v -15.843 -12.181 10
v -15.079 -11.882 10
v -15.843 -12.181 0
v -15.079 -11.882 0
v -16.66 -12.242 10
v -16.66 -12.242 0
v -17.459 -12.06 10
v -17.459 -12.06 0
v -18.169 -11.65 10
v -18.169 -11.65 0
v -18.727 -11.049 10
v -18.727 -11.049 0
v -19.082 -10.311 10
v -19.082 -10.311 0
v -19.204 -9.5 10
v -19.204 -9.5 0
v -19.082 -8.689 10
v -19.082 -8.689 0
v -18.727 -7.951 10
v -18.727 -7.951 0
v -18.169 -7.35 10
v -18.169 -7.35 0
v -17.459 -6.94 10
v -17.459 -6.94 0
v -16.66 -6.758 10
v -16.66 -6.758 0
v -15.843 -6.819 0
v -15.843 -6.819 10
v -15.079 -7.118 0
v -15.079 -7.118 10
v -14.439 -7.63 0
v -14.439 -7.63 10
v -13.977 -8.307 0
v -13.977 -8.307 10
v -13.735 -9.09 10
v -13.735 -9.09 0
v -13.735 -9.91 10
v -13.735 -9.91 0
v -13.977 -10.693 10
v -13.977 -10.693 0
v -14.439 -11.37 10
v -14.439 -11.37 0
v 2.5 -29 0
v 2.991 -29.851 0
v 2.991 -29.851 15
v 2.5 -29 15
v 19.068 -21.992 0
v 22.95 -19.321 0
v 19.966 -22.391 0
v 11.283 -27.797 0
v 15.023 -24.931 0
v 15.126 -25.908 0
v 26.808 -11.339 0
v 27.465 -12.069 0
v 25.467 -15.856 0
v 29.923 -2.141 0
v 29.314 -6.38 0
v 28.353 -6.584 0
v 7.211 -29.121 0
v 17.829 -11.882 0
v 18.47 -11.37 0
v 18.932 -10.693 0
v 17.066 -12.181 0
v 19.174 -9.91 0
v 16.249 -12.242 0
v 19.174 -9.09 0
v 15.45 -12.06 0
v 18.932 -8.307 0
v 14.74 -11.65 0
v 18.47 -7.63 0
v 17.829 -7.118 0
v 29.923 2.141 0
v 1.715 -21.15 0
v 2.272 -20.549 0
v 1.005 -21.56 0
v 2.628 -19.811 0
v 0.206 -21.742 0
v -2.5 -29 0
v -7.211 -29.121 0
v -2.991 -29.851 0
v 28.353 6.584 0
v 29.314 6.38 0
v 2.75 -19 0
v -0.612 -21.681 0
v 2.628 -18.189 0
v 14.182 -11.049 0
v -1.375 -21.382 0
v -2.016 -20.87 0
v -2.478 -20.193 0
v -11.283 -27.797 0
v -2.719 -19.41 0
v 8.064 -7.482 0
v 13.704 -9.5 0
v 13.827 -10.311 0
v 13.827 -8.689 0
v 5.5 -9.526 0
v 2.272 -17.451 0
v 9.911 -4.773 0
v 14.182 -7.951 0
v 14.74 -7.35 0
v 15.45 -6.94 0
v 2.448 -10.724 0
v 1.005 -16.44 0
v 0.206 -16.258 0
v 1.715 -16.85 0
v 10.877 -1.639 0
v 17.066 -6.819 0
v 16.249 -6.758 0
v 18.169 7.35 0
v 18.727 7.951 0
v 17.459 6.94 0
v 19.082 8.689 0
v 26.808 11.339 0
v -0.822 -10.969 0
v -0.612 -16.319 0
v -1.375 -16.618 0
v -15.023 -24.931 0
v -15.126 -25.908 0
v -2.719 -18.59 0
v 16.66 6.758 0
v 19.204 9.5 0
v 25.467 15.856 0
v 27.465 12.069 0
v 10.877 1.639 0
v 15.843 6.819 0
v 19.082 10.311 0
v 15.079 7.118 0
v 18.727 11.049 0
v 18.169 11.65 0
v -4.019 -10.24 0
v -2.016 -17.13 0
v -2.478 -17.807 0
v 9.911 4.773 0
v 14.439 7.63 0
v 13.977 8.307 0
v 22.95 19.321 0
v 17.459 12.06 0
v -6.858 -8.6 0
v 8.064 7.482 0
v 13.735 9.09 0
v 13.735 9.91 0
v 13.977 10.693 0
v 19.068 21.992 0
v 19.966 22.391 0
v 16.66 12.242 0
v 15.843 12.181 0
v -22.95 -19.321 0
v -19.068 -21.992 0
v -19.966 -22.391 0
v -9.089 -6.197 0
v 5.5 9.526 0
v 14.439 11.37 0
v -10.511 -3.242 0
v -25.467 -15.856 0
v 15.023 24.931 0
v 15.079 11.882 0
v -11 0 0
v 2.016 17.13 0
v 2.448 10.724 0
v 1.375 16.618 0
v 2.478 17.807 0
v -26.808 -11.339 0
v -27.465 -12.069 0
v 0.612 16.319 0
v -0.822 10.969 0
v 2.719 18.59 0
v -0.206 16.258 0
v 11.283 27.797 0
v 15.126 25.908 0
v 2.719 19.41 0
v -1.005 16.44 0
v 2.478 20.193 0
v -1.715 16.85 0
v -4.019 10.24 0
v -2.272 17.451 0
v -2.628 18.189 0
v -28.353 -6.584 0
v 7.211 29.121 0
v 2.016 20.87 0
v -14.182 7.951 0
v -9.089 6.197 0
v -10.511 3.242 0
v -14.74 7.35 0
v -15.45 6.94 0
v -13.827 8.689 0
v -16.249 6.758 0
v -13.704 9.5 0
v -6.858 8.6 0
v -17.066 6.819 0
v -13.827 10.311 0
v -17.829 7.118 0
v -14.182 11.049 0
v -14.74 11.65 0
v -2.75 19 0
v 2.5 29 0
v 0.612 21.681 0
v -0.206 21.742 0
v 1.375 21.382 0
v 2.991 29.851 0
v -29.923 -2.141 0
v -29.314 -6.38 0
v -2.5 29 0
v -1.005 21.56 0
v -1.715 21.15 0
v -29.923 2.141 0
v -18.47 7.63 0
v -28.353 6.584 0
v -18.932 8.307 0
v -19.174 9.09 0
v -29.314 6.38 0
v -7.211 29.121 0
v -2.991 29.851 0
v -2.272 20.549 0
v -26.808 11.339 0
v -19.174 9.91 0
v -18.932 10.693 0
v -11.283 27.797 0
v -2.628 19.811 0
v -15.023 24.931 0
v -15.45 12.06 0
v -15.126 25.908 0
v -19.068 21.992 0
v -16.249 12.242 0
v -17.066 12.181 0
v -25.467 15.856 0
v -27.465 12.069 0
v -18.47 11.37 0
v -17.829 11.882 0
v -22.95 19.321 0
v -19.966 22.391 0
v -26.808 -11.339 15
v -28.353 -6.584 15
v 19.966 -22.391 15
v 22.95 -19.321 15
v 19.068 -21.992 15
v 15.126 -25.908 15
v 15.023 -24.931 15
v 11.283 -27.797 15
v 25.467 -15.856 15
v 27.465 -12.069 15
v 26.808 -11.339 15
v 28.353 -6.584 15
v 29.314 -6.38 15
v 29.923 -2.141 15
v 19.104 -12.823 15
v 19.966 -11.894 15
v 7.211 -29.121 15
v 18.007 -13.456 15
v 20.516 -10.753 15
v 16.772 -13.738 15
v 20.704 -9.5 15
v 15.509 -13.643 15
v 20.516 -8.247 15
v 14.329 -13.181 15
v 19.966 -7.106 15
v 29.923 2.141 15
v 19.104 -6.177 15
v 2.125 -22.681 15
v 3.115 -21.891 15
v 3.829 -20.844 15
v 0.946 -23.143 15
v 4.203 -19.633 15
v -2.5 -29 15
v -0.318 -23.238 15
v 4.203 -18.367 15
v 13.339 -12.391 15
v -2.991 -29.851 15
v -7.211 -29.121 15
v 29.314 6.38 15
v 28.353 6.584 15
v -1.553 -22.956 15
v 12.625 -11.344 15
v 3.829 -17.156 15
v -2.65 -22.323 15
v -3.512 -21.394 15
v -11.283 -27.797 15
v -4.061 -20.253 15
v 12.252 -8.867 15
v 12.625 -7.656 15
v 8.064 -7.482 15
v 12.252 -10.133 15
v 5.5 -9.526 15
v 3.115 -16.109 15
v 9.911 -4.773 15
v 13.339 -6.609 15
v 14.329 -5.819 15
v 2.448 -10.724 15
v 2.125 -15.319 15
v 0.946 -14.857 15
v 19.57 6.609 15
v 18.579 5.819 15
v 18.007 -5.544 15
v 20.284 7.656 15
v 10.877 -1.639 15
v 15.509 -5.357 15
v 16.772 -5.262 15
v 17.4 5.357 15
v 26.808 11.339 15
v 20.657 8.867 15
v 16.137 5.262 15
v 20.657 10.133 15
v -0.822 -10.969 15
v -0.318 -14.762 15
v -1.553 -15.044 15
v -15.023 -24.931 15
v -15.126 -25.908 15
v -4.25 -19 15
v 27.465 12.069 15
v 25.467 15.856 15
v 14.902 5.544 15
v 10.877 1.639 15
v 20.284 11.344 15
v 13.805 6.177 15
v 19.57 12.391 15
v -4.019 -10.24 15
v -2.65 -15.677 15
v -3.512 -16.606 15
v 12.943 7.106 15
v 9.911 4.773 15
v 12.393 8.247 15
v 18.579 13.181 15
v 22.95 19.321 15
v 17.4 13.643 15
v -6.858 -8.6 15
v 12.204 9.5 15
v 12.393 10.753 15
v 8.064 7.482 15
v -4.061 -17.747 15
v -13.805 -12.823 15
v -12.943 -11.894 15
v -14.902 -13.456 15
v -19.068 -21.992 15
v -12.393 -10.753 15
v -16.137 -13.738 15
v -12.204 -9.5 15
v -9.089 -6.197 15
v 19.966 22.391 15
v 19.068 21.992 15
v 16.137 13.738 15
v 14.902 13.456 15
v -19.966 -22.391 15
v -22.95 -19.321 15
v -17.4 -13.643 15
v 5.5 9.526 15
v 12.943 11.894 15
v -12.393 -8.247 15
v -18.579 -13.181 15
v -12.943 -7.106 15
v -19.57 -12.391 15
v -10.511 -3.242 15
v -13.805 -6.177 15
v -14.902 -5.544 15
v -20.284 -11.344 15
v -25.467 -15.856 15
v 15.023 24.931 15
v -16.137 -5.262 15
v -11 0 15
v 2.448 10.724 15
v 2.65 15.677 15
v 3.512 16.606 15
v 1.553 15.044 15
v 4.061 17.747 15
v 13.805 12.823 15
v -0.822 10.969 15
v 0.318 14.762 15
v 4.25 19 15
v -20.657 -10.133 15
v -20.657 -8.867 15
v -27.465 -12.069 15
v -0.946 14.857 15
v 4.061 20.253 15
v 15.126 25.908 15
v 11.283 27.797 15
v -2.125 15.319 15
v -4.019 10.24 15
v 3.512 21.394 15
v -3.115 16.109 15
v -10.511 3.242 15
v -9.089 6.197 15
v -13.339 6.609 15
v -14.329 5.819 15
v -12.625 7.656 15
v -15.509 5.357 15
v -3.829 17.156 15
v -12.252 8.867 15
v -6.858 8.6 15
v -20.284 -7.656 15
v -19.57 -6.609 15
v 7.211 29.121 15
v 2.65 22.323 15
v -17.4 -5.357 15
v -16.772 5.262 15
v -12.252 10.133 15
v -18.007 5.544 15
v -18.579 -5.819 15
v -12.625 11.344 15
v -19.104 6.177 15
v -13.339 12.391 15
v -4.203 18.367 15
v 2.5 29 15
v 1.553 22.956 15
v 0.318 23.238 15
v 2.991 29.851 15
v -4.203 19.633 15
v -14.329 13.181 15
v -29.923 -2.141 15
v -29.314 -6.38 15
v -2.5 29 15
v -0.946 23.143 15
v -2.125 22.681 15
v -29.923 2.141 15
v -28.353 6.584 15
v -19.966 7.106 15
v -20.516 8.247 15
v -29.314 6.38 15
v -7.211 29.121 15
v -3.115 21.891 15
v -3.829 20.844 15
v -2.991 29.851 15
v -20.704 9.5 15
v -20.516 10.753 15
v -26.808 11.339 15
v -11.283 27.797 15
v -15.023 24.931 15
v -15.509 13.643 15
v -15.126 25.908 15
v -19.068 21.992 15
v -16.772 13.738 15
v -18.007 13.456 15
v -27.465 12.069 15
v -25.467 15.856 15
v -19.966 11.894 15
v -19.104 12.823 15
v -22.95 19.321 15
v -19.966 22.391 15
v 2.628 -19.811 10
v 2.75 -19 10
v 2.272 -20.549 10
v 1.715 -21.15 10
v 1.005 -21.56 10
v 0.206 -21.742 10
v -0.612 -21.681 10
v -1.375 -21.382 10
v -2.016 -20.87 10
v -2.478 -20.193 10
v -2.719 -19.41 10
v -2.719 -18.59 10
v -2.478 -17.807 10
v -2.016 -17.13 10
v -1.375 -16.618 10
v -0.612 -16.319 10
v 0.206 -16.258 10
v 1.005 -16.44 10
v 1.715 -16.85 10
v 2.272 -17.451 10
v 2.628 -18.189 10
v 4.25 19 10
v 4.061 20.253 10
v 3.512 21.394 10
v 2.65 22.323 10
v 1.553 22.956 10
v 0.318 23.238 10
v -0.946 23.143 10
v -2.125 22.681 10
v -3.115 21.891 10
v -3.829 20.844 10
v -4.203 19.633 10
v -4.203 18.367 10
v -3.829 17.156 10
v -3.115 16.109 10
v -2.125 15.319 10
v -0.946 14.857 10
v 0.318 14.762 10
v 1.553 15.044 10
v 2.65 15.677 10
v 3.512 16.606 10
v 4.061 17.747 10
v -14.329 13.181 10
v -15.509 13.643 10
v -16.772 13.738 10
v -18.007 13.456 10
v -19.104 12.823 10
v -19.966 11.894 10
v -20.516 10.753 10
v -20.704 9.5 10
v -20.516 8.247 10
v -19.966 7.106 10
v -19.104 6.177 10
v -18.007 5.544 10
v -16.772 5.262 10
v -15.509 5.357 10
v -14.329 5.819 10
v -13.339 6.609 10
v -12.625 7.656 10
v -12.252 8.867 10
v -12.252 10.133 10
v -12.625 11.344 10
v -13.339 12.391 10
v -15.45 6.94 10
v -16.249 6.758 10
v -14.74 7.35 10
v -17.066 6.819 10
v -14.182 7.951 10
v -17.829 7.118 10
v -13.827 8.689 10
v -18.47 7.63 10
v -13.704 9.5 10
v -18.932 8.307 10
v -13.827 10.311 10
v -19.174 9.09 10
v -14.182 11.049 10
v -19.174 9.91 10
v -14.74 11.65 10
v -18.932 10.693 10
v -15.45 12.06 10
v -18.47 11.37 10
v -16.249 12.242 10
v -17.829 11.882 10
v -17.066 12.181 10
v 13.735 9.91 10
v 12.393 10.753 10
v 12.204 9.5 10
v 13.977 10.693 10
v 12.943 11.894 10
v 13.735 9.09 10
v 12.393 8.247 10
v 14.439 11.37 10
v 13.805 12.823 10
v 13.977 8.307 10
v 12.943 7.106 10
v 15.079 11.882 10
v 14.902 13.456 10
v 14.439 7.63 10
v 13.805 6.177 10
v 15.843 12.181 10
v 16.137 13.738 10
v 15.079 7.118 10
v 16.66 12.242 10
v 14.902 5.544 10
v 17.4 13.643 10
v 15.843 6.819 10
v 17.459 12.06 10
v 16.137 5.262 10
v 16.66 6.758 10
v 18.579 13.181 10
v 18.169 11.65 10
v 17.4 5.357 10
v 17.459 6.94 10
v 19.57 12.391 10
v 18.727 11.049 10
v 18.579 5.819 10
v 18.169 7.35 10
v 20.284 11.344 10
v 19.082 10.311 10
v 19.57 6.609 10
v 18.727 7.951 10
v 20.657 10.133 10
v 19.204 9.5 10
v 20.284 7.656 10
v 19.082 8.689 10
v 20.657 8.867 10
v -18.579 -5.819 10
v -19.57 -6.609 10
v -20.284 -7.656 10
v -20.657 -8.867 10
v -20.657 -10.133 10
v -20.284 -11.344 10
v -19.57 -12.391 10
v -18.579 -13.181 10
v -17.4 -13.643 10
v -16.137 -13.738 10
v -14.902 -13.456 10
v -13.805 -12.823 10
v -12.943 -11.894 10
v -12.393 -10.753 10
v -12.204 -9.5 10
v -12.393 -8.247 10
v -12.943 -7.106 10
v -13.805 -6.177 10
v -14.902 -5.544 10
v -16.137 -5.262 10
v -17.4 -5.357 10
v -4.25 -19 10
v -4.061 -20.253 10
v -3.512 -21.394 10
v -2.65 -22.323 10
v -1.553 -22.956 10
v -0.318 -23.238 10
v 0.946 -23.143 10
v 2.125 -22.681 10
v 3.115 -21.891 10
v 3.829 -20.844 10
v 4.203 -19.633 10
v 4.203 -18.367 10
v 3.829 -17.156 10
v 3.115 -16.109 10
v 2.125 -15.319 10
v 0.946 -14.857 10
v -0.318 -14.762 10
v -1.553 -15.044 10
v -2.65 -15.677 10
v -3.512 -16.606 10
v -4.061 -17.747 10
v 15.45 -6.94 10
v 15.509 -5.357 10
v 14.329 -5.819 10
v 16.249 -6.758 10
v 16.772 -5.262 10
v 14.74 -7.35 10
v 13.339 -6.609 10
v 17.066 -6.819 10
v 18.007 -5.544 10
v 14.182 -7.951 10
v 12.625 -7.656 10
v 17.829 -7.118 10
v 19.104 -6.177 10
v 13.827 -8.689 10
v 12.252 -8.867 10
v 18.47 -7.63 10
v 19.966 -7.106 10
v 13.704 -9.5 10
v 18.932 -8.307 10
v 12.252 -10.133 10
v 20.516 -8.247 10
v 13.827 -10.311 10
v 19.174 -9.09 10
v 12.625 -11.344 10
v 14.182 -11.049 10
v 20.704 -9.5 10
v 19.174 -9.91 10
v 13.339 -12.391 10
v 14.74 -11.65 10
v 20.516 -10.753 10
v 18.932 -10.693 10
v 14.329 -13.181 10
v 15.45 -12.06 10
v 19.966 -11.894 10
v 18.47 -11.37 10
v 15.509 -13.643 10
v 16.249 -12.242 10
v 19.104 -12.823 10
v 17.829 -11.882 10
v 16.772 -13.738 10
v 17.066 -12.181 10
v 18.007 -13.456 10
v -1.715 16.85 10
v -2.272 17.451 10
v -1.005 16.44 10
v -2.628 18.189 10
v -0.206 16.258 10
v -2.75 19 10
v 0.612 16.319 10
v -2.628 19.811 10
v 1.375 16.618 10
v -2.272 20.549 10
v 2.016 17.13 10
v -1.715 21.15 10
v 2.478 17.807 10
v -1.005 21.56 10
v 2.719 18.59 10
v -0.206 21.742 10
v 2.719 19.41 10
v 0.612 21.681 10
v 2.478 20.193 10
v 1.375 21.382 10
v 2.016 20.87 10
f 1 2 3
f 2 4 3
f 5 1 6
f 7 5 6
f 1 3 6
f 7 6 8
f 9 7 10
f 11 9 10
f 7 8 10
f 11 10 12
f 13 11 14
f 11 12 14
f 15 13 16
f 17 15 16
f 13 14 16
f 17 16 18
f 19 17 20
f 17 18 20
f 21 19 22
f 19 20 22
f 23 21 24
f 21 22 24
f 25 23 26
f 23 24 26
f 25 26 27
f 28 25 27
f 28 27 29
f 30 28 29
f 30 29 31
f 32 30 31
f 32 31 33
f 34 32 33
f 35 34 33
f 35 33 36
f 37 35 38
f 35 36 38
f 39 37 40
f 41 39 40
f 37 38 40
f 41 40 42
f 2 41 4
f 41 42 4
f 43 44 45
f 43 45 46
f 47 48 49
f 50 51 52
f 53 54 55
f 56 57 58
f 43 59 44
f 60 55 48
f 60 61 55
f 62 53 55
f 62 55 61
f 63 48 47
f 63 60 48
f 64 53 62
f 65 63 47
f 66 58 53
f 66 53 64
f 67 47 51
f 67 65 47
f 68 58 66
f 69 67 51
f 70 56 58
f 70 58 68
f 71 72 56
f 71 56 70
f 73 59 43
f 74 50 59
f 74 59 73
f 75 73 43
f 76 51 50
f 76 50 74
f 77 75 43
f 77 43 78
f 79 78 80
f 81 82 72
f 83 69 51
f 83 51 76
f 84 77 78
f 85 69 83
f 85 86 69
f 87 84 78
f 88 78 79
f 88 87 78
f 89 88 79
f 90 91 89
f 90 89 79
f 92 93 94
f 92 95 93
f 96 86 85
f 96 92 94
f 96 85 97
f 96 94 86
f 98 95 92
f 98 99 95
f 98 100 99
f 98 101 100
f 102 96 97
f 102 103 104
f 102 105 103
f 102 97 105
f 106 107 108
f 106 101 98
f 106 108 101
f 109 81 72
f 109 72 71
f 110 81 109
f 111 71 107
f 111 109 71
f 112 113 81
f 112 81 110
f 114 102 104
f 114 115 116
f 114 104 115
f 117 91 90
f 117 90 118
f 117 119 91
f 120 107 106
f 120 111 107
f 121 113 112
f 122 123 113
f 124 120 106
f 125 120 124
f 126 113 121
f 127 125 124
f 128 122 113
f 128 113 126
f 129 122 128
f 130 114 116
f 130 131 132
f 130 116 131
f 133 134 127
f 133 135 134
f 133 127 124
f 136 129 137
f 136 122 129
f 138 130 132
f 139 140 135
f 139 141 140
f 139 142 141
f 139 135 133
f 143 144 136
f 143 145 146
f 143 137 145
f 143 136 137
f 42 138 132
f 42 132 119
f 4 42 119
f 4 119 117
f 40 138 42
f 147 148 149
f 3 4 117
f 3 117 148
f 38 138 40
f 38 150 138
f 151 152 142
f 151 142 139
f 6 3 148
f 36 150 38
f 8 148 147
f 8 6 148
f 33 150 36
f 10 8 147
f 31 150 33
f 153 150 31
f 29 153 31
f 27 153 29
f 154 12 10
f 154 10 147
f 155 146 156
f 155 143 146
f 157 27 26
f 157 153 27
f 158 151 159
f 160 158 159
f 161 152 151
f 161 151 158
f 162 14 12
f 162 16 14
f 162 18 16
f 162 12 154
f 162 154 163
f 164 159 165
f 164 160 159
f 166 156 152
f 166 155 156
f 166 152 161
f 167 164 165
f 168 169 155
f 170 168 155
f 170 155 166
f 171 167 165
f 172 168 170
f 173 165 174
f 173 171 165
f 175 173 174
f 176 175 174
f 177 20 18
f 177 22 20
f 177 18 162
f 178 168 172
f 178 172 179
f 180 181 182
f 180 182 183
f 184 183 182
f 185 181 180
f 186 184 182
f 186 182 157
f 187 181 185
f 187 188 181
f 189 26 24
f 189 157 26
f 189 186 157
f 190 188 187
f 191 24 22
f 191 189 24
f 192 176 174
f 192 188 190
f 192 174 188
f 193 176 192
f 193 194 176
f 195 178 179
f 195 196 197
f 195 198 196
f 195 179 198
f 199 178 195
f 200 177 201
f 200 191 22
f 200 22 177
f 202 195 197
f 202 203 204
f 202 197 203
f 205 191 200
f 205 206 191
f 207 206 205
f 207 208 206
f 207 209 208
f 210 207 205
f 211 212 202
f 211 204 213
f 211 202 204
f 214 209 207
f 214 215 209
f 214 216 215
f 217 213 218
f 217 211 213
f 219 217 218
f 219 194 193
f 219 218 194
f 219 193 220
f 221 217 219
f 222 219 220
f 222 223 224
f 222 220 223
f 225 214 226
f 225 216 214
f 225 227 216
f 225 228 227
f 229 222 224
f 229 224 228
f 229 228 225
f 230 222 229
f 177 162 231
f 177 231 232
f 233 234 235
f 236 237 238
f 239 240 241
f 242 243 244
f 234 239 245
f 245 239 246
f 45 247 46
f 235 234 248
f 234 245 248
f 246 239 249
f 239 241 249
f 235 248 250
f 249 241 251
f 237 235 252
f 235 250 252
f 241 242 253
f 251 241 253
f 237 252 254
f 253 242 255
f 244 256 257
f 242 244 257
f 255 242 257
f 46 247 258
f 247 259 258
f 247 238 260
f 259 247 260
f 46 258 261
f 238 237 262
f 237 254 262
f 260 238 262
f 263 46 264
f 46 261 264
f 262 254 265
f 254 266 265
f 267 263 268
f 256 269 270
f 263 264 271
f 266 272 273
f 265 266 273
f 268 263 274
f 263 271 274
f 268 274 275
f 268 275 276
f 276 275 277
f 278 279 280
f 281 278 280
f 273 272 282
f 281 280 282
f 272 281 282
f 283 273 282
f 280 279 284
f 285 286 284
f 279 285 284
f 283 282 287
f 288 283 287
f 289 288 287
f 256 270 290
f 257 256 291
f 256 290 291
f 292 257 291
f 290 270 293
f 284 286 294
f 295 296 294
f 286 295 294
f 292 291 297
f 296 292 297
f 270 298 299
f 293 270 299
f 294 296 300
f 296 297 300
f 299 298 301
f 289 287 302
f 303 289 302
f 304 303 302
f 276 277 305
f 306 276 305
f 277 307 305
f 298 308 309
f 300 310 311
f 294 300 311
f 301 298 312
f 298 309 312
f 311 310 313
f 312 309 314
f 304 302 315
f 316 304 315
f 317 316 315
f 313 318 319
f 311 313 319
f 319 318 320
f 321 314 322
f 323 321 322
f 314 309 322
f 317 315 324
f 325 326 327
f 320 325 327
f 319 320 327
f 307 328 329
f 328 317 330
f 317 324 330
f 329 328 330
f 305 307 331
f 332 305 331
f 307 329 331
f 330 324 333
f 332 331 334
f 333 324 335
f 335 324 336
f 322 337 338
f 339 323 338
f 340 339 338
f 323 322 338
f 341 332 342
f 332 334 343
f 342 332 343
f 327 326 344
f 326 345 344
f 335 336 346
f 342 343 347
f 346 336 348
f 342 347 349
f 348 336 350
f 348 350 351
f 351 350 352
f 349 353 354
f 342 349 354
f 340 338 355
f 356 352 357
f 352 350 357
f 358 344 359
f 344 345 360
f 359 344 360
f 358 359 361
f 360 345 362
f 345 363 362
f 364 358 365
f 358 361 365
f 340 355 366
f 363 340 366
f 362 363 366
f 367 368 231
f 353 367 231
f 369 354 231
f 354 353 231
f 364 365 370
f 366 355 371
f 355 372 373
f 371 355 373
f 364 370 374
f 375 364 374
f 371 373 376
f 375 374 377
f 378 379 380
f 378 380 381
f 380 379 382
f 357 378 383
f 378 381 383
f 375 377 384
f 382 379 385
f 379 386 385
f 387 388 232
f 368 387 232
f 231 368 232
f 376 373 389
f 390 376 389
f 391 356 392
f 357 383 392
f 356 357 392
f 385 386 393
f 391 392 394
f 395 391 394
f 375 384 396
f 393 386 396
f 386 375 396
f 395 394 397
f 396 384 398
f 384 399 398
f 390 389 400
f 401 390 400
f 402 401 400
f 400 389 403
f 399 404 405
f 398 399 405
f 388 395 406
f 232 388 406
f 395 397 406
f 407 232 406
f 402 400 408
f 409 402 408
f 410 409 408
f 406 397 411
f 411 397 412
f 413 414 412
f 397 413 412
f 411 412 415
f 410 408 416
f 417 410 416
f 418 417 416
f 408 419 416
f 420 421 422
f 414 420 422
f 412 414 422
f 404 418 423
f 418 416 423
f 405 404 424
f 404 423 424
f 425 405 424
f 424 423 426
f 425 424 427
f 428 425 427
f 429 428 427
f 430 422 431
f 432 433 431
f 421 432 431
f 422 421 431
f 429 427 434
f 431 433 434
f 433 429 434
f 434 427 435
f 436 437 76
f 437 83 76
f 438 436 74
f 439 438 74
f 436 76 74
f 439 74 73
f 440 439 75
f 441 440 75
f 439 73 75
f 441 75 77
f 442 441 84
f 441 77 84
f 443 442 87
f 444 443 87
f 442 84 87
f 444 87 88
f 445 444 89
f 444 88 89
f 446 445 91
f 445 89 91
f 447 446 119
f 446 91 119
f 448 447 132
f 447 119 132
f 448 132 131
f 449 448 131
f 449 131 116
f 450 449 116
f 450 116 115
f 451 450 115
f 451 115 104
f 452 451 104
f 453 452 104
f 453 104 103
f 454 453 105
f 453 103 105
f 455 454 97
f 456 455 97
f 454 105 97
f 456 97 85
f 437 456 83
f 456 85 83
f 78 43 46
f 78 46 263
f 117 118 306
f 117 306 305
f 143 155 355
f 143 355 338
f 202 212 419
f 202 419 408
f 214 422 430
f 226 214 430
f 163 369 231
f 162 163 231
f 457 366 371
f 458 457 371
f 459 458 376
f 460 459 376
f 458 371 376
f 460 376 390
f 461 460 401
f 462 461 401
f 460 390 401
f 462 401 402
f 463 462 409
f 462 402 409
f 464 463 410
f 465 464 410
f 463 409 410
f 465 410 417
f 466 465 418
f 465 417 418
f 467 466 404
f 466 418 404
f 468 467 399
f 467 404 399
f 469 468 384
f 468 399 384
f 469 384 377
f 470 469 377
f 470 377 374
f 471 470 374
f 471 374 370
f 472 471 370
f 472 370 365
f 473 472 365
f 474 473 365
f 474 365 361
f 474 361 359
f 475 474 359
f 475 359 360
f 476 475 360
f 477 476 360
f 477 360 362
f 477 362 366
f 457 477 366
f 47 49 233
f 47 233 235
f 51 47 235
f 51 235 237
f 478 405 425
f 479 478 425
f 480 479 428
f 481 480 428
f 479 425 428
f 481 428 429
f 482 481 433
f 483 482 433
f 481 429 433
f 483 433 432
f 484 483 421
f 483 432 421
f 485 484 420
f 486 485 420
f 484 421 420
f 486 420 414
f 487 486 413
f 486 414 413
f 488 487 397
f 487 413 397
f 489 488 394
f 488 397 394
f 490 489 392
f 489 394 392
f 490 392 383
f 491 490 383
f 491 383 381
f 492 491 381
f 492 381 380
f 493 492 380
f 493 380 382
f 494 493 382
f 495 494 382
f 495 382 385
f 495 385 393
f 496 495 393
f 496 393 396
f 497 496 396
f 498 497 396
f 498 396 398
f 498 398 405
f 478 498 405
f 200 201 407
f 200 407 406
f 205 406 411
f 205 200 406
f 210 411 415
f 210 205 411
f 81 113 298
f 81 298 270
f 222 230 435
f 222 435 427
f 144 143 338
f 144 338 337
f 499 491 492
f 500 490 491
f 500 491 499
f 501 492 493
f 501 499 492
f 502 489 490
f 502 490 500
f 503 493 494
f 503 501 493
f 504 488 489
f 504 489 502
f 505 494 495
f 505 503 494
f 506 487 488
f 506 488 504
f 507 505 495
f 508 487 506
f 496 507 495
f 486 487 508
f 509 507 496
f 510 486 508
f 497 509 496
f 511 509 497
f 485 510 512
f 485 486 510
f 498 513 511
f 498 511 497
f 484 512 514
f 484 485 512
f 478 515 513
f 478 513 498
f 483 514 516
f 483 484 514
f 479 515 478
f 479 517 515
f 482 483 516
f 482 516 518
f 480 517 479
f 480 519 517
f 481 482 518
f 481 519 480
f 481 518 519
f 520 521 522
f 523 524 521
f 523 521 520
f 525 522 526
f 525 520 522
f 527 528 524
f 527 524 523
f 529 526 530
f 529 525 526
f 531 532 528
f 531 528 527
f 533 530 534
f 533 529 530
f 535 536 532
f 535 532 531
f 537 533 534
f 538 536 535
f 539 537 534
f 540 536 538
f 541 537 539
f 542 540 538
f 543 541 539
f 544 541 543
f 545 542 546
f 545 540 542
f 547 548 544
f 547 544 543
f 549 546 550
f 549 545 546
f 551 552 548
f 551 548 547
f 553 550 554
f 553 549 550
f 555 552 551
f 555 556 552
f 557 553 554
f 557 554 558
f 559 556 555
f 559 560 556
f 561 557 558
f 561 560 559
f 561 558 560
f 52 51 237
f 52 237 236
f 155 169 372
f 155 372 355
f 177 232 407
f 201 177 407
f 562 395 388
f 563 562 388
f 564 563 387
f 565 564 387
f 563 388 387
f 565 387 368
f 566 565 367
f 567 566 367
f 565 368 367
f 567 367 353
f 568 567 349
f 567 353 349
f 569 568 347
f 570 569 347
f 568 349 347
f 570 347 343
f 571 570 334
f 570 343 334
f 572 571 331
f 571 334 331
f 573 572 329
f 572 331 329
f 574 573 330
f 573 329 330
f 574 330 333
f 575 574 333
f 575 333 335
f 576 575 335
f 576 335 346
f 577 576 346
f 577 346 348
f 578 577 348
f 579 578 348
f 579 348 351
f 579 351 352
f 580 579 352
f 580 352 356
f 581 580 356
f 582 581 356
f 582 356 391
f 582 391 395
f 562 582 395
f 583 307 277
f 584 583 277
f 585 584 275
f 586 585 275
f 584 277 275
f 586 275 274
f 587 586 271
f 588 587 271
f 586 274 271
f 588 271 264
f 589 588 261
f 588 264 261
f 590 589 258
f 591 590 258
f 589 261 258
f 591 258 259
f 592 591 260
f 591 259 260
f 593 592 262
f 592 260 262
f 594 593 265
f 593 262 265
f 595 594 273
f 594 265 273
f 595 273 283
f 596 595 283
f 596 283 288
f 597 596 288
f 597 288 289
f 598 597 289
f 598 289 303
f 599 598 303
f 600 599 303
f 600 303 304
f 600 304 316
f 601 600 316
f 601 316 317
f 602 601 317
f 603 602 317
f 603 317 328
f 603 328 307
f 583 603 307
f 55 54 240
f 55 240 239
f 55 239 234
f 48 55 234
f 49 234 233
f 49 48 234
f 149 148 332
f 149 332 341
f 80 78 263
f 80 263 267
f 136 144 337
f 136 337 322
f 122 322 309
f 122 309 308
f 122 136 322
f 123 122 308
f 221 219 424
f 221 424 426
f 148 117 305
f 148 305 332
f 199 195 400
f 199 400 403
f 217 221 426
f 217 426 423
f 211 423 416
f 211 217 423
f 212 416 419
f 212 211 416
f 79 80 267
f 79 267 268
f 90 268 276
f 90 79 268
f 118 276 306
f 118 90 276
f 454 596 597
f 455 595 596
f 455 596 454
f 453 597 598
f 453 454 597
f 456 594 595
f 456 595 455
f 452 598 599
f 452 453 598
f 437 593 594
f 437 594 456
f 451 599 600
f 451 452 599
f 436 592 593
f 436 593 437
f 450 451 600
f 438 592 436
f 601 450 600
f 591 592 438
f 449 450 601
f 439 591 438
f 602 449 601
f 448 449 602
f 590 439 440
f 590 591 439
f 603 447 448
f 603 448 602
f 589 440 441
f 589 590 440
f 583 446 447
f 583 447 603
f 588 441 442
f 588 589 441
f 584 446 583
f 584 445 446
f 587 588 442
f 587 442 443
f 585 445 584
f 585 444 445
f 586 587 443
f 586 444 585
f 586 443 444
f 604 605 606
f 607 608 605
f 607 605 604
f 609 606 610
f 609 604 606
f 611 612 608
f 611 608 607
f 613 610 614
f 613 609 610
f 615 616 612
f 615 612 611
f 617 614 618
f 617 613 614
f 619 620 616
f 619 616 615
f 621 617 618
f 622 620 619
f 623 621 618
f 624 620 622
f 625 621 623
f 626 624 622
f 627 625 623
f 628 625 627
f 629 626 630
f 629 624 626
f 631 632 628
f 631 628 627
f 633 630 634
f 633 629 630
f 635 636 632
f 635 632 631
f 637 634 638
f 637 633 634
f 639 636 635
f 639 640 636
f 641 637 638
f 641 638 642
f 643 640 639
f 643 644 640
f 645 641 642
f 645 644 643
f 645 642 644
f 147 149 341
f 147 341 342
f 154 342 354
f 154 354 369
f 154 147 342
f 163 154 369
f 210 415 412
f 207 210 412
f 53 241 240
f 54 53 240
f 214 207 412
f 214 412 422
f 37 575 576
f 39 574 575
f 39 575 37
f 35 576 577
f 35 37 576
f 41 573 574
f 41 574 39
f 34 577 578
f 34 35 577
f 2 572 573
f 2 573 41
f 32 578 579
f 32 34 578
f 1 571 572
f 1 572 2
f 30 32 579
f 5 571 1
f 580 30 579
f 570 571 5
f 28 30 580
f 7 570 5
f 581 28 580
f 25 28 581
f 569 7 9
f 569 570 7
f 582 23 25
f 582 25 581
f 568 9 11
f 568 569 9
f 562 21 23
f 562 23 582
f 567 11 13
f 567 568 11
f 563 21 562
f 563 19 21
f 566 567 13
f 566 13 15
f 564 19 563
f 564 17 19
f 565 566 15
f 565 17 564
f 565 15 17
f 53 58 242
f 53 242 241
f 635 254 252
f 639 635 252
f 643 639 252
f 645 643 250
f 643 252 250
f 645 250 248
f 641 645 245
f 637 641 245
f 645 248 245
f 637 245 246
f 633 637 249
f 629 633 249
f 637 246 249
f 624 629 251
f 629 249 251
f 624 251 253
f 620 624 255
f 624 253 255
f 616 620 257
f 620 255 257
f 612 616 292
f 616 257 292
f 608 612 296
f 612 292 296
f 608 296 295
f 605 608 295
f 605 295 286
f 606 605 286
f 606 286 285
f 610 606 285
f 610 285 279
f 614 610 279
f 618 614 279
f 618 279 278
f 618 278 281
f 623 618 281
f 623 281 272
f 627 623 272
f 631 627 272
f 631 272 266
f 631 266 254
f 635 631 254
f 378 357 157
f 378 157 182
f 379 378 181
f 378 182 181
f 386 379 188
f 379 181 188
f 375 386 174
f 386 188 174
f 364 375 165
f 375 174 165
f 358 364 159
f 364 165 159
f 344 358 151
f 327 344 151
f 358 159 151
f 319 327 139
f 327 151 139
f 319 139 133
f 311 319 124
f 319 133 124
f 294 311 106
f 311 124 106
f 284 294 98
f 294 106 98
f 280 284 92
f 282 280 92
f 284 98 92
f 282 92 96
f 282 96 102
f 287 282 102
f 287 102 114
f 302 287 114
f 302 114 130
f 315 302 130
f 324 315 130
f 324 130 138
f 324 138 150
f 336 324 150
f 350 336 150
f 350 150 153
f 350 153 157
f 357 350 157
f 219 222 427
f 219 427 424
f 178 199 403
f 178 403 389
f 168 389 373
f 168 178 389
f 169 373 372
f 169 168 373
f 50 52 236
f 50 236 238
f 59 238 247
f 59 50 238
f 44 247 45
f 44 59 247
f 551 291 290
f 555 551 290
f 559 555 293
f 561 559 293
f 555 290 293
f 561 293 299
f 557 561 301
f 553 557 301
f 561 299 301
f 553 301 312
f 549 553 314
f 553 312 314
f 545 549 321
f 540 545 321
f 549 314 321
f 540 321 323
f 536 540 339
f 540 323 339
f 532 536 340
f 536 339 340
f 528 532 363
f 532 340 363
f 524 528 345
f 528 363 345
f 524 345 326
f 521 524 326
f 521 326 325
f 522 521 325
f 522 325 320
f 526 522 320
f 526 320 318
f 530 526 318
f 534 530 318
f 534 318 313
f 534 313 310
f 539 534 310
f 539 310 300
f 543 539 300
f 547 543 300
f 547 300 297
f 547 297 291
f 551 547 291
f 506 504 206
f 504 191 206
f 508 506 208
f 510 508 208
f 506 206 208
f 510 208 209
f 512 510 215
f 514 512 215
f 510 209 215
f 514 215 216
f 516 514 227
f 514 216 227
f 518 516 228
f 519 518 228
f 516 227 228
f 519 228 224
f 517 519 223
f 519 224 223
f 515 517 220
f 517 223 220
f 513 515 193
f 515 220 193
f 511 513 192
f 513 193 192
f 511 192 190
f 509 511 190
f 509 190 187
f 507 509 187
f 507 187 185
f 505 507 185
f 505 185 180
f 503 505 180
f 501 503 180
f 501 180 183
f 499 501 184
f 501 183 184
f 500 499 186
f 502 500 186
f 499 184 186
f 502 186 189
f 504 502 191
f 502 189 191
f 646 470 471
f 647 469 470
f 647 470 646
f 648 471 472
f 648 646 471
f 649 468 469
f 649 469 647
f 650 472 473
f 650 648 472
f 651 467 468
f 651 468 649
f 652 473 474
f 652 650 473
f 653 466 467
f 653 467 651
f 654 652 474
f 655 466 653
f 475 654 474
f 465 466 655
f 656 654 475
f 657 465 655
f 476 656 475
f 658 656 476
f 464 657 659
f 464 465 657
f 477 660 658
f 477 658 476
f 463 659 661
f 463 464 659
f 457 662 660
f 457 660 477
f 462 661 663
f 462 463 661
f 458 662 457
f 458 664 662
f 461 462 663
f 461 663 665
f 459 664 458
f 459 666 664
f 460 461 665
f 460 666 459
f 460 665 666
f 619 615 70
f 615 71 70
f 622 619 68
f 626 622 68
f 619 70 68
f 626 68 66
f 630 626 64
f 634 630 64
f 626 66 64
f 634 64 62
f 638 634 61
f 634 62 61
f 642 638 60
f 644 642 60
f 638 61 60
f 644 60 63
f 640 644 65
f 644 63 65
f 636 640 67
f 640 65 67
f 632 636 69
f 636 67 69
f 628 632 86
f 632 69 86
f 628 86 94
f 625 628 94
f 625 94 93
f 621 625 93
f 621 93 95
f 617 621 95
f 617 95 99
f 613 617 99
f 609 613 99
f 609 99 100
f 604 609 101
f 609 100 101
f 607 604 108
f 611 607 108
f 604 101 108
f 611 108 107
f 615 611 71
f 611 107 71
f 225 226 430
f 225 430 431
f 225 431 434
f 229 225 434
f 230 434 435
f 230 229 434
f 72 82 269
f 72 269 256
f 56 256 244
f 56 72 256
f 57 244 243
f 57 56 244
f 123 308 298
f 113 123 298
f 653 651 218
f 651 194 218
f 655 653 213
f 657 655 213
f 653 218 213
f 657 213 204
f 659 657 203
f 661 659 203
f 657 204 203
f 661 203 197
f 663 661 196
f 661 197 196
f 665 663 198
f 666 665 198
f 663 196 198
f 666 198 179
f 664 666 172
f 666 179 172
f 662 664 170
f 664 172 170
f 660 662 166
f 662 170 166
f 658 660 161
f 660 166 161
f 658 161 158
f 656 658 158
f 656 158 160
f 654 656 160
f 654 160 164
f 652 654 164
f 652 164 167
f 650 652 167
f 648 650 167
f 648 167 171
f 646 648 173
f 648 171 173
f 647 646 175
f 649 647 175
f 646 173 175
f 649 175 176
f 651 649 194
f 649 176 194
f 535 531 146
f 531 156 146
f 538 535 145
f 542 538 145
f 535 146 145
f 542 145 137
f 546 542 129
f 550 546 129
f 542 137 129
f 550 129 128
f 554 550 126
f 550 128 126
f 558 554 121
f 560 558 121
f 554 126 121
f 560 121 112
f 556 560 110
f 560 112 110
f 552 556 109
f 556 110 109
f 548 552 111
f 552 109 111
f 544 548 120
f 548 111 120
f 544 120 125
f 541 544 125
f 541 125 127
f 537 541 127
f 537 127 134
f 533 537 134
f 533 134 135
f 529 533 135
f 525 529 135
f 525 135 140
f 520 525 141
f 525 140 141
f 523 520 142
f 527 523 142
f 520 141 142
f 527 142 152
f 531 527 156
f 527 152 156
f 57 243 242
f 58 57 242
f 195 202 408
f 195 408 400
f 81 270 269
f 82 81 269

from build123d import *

# Parameters (mm, degrees)
BOSS_EXTRUDE1_DEPTH                                 = 15
M24X2_0_TAPPED_HOLE1_D                              = 22
M24X2_0_TAPPED_HOLE1_DEPTH                          = 58
M24X2_0_TAPPED_HOLE1_TIP                            = 6.609466809
CBORE_FOR_M5_HEX_SOCKET_HEAD_CAP_SCREW1_D           = 5.5
CBORE_FOR_M5_HEX_SOCKET_HEAD_CAP_SCREW1_CBORE_D     = 8.5
CBORE_FOR_M5_HEX_SOCKET_HEAD_CAP_SCREW1_CBORE_DEPTH = 5
CIRPATTERN3_COUNT                                   = 6


with BuildPart() as part:
    # Sketch1 → Boss-Extrude1 (new body)
    with BuildSketch(Plane.XY):
        with BuildLine():
            Line((-2.5, 29), (2.5, 29))
            Line((2.5, 29), (2.991048754, 29.850521392))
            ThreePointArc((2.991048754, 29.850521392), (9.270509831, 28.531695489), (15.125886974, 25.907673443))
            Line((15.125886974, 25.907673443), (15.023229831, 24.930955968))
            Line((15.023229831, 24.930955968), (19.068314802, 21.992029706))
            Line((19.068314802, 21.992029706), (19.965505521, 22.39148475))
            ThreePointArc((19.965505521, 22.39148475), (24.270509831, 17.633557569), (27.465247988, 12.068974809))
            Line((27.465247988, 12.068974809), (26.808096487, 11.339134128))
            Line((26.808096487, 11.339134128), (28.353181458, 6.583851546))
            Line((28.353181458, 6.583851546), (29.31381778, 6.379661993))
            ThreePointArc((29.31381778, 6.379661993), (30, 0), (29.31381778, -6.379661993))
            Line((29.31381778, -6.379661993), (28.353181458, -6.583851546))
            Line((28.353181458, -6.583851546), (26.808096487, -11.339134128))
            Line((26.808096487, -11.339134128), (27.465247988, -12.068974809))
            ThreePointArc((27.465247988, -12.068974809), (24.270509831, -17.633557569), (19.965505521, -22.39148475))
            Line((19.965505521, -22.39148475), (19.068314802, -21.992029706))
            Line((19.068314802, -21.992029706), (15.023229831, -24.930955968))
            Line((15.023229831, -24.930955968), (15.125886974, -25.907673443))
            ThreePointArc((15.125886974, -25.907673443), (9.270509831, -28.531695489), (2.991048754, -29.850521392))
            Line((2.991048754, -29.850521392), (2.5, -29))
            Line((2.5, -29), (-2.5, -29))
            Line((-2.5, -29), (-2.991048754, -29.850521392))
            ThreePointArc((-2.991048754, -29.850521392), (-9.270509831, -28.531695489), (-15.125886974, -25.907673443))
            Line((-15.125886974, -25.907673443), (-15.023229831, -24.930955968))
            Line((-15.023229831, -24.930955968), (-19.068314802, -21.992029706))
            Line((-19.068314802, -21.992029706), (-19.965505521, -22.39148475))
            ThreePointArc((-19.965505521, -22.39148475), (-24.270509831, -17.633557569), (-27.465247988, -12.068974809))
            Line((-27.465247988, -12.068974809), (-26.808096487, -11.339134128))
            Line((-26.808096487, -11.339134128), (-28.353181458, -6.583851546))
            Line((-28.353181458, -6.583851546), (-29.31381778, -6.379661993))
            ThreePointArc((-29.31381778, -6.379661993), (-30, 0), (-29.31381778, 6.379661993))
            Line((-29.31381778, 6.379661993), (-28.353181458, 6.583851546))
            Line((-28.353181458, 6.583851546), (-26.808096487, 11.339134128))
            Line((-26.808096487, 11.339134128), (-27.465247988, 12.068974809))
            ThreePointArc((-27.465247988, 12.068974809), (-24.270509831, 17.633557569), (-19.965505521, 22.39148475))
            Line((-19.965505521, 22.39148475), (-19.068314802, 21.992029706))
            Line((-19.068314802, 21.992029706), (-15.023229831, 24.930955968))
            Line((-15.023229831, 24.930955968), (-15.125886974, 25.907673443))
            ThreePointArc((-15.125886974, 25.907673443), (-9.270509831, 28.531695489), (-2.991048754, 29.850521392))
            Line((-2.991048754, 29.850521392), (-2.5, 29))
        make_face()
    extrude(amount=BOSS_EXTRUDE1_DEPTH)

    # M24x2.0 Tapped Hole1
    with Locations(Plane.XY.offset(15)):
        with Locations((0, 0)):
            Hole(M24X2_0_TAPPED_HOLE1_D / 2, depth=M24X2_0_TAPPED_HOLE1_DEPTH)
            with Locations((0, 0, -(M24X2_0_TAPPED_HOLE1_DEPTH + M24X2_0_TAPPED_HOLE1_TIP / 2))):  # 118° drill point
                Cone(0, M24X2_0_TAPPED_HOLE1_D / 2, M24X2_0_TAPPED_HOLE1_TIP, mode=Mode.SUBTRACT)

    # CBORE for M5 Hex Socket Head Cap Screw1 (through all)
    with Locations(Plane.XY.offset(15)):
        with Locations((0, 19)):
            cbore_for_m5_hex_socket_head_cap_screw1 = CounterBoreHole(CBORE_FOR_M5_HEX_SOCKET_HEAD_CAP_SCREW1_D / 2, CBORE_FOR_M5_HEX_SOCKET_HEAD_CAP_SCREW1_CBORE_D / 2, CBORE_FOR_M5_HEX_SOCKET_HEAD_CAP_SCREW1_CBORE_DEPTH)

    # CirPattern3: CBORE for M5 Hex Socket Head Cap Screw1 ×6 about axis
    cirpattern3_axis = Axis((0, 0, 0), (0, 0, 1))
    for i in range(1, CIRPATTERN3_COUNT):
        add(cbore_for_m5_hex_socket_head_cap_screw1.rotate(cirpattern3_axis, i * 360 / CIRPATTERN3_COUNT), mode=Mode.SUBTRACT)


solid = part.part
